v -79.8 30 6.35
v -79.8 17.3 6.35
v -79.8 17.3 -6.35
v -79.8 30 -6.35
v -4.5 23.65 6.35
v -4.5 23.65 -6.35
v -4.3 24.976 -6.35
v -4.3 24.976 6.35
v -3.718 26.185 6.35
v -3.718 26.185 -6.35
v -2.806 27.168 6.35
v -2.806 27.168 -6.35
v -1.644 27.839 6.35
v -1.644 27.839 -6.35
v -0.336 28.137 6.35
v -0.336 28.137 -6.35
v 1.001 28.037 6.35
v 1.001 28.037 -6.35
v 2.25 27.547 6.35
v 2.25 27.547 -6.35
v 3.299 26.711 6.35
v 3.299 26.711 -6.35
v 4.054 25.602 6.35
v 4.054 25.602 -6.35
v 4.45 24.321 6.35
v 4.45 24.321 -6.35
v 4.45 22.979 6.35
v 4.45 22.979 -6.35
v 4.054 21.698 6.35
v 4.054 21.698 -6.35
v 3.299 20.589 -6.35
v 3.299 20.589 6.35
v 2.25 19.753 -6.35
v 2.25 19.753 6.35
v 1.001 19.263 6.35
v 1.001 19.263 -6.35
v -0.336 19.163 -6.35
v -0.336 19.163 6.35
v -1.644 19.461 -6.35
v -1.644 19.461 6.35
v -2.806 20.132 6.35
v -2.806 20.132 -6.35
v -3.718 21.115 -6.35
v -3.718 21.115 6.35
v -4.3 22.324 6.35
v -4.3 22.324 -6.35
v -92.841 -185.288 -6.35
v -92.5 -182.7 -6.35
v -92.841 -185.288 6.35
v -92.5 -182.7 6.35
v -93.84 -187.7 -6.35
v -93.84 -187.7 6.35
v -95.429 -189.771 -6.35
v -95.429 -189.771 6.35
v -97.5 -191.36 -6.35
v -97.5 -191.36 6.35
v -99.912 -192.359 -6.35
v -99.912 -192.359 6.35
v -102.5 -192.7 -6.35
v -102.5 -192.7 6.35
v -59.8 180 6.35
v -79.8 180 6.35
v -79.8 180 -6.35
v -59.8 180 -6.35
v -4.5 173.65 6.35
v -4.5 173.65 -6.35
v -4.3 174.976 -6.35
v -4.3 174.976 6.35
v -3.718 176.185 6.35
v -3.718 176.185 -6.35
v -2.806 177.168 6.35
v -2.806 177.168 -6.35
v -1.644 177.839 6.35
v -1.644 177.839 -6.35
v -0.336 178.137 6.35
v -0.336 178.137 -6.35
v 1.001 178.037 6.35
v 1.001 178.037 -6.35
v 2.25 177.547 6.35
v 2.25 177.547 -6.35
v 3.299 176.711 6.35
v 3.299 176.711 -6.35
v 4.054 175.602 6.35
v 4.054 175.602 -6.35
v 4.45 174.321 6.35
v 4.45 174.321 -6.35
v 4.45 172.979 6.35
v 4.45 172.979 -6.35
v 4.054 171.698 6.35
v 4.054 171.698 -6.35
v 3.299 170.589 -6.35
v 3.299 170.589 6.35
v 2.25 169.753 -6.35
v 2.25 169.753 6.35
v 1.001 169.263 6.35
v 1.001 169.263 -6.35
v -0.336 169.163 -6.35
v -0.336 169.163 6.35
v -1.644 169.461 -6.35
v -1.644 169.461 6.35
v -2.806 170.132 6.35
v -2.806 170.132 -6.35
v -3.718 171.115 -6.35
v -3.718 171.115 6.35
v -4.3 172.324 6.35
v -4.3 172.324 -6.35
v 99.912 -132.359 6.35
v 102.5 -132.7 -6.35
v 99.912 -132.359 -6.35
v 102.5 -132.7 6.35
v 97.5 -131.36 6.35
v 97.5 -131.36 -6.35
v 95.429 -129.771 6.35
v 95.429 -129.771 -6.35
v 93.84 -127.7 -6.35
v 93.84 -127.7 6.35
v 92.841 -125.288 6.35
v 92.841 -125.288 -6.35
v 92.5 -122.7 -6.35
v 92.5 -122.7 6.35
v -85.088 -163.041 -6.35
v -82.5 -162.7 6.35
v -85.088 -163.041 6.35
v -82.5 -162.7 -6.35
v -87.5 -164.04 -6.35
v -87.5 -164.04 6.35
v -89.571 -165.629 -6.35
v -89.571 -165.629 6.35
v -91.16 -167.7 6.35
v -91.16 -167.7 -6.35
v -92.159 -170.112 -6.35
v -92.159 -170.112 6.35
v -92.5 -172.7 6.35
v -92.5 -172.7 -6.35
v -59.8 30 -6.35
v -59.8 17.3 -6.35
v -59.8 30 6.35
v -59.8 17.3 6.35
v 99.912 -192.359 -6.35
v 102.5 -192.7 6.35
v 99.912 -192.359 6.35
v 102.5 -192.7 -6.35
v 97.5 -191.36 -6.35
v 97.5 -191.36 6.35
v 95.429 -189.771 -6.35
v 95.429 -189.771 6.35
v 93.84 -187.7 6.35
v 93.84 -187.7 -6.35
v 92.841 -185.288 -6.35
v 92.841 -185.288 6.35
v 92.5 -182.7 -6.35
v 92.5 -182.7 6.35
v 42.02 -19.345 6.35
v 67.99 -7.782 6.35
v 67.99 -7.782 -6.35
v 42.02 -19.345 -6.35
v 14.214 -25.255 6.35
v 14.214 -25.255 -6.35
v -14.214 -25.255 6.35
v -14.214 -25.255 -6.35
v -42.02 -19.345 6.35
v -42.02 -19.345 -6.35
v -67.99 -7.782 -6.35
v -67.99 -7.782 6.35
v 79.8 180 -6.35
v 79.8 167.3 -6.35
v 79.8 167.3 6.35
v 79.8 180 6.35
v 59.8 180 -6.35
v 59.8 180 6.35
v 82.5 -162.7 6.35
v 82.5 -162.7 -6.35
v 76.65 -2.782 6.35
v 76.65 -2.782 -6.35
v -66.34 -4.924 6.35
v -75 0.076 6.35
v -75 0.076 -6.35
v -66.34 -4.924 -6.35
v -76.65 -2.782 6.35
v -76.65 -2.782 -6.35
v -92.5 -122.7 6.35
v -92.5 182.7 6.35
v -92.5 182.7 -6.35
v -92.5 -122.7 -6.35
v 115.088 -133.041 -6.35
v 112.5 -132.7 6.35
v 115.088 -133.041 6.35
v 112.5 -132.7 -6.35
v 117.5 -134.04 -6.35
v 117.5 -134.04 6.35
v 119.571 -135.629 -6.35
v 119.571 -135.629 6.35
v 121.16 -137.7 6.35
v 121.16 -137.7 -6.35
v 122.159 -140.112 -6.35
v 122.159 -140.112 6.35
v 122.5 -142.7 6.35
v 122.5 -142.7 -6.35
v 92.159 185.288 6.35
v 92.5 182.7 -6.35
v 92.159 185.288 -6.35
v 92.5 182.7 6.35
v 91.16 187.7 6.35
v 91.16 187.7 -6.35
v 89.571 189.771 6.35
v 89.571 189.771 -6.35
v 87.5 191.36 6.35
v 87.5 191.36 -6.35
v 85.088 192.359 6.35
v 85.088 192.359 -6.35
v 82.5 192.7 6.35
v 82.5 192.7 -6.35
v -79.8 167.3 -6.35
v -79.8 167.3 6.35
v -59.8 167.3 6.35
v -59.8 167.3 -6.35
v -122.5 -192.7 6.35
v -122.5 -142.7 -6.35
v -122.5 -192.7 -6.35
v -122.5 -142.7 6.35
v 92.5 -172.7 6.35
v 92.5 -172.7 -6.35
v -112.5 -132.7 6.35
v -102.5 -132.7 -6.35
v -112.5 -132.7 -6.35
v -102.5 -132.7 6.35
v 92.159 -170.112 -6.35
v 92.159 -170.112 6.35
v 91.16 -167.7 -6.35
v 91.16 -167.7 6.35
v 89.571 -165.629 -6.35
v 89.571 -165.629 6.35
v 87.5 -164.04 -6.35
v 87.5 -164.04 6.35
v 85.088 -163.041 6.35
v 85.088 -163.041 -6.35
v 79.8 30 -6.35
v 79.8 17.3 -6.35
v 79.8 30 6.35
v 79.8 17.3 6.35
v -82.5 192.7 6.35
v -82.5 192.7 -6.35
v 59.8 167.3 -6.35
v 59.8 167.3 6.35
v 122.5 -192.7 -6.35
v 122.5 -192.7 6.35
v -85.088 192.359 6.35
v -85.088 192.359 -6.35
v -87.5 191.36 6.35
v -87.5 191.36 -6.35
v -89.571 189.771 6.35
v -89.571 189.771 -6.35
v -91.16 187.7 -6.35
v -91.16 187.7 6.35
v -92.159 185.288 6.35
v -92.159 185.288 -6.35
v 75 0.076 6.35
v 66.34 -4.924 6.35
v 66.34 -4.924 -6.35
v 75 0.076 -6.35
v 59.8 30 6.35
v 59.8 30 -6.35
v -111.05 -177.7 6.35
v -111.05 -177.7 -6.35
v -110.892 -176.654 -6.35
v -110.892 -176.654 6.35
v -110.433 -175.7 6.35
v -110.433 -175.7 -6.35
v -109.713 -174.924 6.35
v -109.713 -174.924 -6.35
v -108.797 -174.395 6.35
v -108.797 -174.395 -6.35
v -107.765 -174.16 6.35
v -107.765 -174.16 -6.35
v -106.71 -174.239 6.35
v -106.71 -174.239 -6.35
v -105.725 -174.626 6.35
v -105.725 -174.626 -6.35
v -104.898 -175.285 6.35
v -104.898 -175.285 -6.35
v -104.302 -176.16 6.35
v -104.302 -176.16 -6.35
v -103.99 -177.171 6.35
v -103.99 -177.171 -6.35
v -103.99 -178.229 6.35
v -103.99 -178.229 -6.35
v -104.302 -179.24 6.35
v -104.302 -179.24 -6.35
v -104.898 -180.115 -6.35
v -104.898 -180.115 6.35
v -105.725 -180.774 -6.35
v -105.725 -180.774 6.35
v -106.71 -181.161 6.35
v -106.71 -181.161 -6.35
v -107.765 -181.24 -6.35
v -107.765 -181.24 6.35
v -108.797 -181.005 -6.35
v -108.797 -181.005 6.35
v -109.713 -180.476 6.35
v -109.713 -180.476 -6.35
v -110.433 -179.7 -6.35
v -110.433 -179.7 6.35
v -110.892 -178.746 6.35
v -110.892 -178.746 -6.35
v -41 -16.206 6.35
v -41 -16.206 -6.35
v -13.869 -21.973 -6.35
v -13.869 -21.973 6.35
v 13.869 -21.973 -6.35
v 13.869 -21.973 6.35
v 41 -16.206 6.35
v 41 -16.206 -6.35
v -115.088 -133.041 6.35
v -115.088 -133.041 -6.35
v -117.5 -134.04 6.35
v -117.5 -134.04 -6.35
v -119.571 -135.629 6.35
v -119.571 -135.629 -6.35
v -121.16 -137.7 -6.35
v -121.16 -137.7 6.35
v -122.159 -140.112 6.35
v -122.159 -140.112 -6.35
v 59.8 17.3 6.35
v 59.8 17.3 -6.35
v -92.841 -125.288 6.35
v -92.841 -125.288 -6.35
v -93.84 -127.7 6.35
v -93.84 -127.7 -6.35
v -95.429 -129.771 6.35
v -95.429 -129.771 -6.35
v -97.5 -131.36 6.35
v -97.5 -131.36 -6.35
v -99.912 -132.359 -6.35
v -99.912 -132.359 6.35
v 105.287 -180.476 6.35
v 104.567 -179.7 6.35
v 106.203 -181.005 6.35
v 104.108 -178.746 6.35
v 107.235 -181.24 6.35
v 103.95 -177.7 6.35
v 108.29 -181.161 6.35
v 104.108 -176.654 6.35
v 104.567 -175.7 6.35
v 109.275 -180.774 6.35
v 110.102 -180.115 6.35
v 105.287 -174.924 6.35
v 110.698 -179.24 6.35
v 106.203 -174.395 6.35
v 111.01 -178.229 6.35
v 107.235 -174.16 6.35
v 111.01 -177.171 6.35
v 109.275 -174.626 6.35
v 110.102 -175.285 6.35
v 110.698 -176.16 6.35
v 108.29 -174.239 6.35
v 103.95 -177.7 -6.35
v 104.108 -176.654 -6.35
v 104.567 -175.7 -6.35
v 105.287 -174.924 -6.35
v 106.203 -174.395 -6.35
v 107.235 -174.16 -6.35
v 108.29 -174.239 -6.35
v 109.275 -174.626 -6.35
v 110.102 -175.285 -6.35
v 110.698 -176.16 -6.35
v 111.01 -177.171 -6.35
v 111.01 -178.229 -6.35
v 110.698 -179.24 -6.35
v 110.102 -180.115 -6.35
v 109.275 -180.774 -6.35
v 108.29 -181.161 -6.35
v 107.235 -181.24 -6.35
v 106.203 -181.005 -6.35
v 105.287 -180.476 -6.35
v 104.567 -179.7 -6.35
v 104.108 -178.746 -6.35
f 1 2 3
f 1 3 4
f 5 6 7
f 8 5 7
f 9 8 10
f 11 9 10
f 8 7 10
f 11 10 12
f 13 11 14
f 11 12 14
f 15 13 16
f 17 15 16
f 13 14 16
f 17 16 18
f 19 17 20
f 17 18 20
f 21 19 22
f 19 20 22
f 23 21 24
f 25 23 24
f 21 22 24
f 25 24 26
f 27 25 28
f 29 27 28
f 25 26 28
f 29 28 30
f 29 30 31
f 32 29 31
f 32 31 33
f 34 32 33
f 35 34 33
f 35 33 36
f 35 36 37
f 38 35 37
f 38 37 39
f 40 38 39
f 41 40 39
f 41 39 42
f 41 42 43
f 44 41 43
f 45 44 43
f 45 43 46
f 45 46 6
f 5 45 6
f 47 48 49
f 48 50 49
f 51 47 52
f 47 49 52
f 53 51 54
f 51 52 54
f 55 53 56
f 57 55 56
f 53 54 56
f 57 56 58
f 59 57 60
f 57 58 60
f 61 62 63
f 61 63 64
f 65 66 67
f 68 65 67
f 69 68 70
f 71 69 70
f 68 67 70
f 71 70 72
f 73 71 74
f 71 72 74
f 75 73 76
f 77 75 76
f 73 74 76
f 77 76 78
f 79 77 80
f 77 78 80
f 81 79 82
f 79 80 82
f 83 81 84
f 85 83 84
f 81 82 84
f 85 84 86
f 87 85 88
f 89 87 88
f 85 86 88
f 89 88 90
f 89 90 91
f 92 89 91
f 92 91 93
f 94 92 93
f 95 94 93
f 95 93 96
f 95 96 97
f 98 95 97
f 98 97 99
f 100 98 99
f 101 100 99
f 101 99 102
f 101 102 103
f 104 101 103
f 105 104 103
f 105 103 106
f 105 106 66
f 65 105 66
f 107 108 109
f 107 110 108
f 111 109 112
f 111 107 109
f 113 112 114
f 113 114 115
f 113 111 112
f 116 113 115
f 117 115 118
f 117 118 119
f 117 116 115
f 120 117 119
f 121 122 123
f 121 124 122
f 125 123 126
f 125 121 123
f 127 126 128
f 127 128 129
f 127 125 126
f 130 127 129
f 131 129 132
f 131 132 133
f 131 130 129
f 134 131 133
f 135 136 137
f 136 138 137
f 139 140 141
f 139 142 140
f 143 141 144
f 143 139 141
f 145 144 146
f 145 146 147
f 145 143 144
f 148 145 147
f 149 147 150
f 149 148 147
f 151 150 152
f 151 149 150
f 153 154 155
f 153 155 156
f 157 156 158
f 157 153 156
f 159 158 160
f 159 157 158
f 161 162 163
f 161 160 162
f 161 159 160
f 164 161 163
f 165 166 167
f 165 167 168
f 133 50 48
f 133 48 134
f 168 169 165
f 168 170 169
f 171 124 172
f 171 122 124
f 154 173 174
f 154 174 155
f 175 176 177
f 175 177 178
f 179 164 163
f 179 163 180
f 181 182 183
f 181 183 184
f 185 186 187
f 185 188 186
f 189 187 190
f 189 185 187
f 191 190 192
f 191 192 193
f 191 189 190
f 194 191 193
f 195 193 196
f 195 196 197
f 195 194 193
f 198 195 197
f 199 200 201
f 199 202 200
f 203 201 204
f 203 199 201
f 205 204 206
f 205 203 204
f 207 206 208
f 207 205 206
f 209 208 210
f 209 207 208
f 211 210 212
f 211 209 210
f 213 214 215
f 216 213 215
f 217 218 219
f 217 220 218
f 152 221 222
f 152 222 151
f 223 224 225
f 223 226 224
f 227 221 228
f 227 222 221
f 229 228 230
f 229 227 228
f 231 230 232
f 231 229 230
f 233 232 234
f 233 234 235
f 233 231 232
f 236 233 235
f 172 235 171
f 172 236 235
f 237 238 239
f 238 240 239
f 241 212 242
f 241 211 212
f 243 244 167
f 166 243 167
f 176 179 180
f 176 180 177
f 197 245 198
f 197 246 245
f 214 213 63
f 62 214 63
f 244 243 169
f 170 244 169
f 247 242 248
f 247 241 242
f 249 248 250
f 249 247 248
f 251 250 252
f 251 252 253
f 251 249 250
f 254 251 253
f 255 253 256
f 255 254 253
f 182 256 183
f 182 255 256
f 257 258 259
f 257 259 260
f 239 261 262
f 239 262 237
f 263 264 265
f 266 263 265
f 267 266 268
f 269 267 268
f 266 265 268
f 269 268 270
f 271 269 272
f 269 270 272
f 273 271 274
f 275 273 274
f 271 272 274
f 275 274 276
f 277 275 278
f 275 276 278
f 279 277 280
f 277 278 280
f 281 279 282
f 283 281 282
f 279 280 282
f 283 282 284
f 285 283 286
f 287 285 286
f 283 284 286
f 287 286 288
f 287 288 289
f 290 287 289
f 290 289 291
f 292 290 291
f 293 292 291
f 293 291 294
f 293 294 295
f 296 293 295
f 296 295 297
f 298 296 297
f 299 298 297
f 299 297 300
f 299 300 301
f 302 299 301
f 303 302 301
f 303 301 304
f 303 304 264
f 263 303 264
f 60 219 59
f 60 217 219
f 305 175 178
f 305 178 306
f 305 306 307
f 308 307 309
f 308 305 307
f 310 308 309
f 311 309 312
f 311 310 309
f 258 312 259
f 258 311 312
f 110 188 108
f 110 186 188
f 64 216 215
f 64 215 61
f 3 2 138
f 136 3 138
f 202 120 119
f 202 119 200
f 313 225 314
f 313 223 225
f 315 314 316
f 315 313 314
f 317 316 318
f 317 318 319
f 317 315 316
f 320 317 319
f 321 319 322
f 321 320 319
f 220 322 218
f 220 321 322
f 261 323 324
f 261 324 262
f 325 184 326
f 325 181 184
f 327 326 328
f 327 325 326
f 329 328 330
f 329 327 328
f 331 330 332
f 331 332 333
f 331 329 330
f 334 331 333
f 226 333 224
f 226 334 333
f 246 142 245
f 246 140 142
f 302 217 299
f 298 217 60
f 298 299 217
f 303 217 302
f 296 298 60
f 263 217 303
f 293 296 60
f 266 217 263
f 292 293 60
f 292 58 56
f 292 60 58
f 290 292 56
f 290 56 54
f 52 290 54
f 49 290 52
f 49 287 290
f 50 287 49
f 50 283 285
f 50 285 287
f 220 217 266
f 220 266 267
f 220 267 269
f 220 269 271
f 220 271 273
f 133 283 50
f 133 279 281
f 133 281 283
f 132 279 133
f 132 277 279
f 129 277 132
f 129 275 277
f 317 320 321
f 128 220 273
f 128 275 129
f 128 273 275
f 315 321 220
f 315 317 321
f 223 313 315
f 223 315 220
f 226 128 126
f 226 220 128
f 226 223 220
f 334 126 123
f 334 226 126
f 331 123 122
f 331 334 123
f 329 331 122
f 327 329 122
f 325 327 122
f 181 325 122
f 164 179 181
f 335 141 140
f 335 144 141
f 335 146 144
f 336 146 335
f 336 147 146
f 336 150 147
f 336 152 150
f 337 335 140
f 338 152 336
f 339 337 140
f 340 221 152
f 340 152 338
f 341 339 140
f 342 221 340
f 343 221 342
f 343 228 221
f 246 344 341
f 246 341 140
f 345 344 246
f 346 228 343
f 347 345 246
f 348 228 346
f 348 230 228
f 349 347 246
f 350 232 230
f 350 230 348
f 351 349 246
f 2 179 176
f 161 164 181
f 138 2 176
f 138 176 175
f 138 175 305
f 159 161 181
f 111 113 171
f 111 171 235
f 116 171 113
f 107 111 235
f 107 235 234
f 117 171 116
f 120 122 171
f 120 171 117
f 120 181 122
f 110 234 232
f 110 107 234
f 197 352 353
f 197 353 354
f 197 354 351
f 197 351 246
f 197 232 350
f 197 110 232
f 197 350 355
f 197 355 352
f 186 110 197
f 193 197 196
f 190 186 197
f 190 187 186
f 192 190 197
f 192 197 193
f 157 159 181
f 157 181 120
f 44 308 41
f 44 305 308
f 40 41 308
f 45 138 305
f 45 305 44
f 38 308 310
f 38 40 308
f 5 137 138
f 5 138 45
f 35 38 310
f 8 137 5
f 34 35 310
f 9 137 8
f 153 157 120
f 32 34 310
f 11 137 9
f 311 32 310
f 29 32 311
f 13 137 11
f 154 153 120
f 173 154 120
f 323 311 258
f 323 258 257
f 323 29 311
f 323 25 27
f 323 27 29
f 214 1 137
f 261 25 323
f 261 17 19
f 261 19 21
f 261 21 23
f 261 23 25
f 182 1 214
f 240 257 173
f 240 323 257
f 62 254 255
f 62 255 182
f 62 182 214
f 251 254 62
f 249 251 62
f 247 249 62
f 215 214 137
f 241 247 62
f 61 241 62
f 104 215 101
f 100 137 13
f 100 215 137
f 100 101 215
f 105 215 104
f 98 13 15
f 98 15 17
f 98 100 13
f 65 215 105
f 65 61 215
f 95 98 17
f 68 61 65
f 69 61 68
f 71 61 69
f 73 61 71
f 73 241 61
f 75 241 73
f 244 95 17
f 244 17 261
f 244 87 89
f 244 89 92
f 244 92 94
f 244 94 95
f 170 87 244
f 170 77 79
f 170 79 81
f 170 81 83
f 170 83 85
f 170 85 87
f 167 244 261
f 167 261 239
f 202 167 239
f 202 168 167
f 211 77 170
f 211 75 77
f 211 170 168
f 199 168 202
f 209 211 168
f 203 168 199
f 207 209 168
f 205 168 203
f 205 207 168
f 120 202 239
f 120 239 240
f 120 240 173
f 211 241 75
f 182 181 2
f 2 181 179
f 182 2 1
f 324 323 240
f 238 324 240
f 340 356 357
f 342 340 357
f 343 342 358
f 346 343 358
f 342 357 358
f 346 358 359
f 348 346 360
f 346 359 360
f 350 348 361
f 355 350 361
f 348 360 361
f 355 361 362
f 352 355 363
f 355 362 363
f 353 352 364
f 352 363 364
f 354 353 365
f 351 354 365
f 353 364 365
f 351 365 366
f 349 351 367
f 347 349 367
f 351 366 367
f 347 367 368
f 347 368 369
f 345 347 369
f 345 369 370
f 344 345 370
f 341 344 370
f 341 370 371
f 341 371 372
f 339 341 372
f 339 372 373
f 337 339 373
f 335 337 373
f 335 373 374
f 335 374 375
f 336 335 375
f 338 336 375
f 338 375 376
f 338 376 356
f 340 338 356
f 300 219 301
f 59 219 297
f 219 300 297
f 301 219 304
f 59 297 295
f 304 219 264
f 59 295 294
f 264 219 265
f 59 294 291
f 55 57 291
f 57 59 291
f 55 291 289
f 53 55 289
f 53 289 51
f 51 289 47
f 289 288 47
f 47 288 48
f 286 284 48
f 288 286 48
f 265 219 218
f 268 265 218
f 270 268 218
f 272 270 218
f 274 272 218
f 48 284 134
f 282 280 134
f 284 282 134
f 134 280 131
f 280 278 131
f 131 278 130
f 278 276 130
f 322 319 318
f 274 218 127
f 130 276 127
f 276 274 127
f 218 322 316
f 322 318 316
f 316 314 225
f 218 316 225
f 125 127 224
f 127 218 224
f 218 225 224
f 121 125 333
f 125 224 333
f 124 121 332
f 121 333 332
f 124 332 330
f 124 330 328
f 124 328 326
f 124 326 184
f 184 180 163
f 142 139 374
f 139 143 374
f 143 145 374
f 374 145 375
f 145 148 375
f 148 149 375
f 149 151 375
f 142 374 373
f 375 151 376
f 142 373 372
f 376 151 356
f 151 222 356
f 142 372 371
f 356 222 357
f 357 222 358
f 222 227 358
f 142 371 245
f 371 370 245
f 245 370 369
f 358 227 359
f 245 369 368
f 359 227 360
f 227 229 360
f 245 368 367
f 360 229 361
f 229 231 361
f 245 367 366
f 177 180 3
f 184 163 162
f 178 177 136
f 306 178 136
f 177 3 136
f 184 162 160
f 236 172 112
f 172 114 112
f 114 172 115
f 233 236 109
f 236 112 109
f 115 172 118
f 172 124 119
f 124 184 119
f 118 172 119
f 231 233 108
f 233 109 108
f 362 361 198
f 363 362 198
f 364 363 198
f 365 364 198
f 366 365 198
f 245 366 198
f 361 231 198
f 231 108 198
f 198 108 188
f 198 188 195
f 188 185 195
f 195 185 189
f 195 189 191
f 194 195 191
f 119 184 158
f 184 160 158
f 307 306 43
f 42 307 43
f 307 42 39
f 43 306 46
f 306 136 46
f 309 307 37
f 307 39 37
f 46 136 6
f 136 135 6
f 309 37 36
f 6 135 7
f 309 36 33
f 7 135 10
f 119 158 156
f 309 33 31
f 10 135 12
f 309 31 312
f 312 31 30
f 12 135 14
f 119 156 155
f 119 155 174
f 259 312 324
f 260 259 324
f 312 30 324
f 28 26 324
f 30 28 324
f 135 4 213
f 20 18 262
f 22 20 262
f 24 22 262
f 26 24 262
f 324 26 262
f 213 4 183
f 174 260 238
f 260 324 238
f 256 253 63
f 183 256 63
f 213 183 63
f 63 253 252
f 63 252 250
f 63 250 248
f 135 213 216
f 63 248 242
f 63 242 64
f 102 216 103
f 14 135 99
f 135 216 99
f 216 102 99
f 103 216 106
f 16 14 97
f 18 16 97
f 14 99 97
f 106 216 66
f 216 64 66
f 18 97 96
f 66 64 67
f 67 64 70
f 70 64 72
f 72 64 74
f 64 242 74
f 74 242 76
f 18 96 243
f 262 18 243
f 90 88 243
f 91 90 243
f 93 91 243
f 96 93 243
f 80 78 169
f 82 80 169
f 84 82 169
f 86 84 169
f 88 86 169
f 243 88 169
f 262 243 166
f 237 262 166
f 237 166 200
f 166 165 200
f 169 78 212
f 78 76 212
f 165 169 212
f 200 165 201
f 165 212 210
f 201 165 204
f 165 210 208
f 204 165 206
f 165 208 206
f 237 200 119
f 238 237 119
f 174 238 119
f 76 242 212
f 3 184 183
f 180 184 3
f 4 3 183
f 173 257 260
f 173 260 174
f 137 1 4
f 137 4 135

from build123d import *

# Parameters (mm, degrees)
MAIN_W                 = 20
MAIN_H                 = 12.7
BOSS_EXTRUDE1_DEPTH    = 6.35
M6_5_CLEARANCE_HOLE1_D = 7.1
CUT_EXTRUDE1_DEPTH     = 229.693747182
M8_CLEARANCE_HOLE1_D   = 9
FILLET1_R              = 10


with BuildPart() as part:
    # MAIN → Boss-Extrude1 (new, symmetric)
    # profile 1 of 3: a face of its own
    with BuildSketch(Plane.XY):
        Polygon((92.5, 192.7), (-92.5, 192.7), (-92.5, -132.7), (-92.5, -162.7), (92.5, -162.7), (92.5, -132.7), align=None)
        with Locations((-69.8, 23.65)):
            Rectangle(MAIN_W, MAIN_H, mode=Mode.SUBTRACT)
        with Locations((-69.8, 173.65)):
            Rectangle(MAIN_W, MAIN_H, mode=Mode.SUBTRACT)
        with Locations((69.8, 23.65)):
            Rectangle(MAIN_W, MAIN_H, mode=Mode.SUBTRACT)
        with Locations((69.8, 173.65)):
            Rectangle(MAIN_W, MAIN_H, mode=Mode.SUBTRACT)
    # profile 2 of 3: a face of its own
    with BuildSketch(Plane.XY):
        Polygon((-92.5, -162.7), (-92.5, -132.7), (-122.5, -132.7), (-122.5, -192.7), (-92.5, -192.7), align=None)
    # profile 3 of 3: a face of its own
    with BuildSketch(Plane.XY):
        Polygon((122.5, -132.7), (92.5, -132.7), (92.5, -162.7), (92.5, -192.7), (122.5, -192.7), align=None)
    extrude(amount=BOSS_EXTRUDE1_DEPTH, both=True)

    # M6.5 Clearance Hole1 (through all)
    with Locations(Plane.XY.offset(6.35)):
        with Locations((-107.5, -177.7), (107.5, -177.7)):
            Hole(M6_5_CLEARANCE_HOLE1_D / 2)

    # Sketch1 → Cut-Extrude1 (cut, through all)
    with BuildSketch(Plane.XY.offset(6.35)):
        with BuildLine():
            Line((-67.989745962, -7.782202476), (-76.65, -2.782202476))
            Line((-76.65, -2.782202476), (-75, 0.075681357))
            Line((-75, 0.075681357), (-66.339745962, -4.924318643))
            ThreePointArc((-66.339745962, -4.924318643), (0, -22.7), (66.339745962, -4.924318643))
            Line((66.339745962, -4.924318643), (75, 0.075681357))
            Line((75, 0.075681357), (76.65, -2.782202476))
            Line((76.65, -2.782202476), (67.989745962, -7.782202476))
            ThreePointArc((67.989745962, -7.782202476), (0, -26), (-67.989745962, -7.782202476))
        make_face()
    extrude(amount=-CUT_EXTRUDE1_DEPTH, mode=Mode.SUBTRACT)

    # M8 Clearance Hole1 (through all)
    with Locations(Plane.XY.offset(6.35)):
        with Locations((0, 173.65), (0, 23.65)):
            Hole(M8_CLEARANCE_HOLE1_D / 2)

    # Fillet1
    fillet1_edges = [part.edges().sort_by_distance(p)[0] for p in [
        (-92.5, 192.7, 0),
        (92.5, 192.7, 0),
        (92.5, -132.7, 0),
        (122.5, -132.7, 0),
        (92.5, -192.7, 0),
        (92.5, -162.7, 0),
        (-92.5, -162.7, 0),
        (-92.5, -192.7, 0),
        (-122.5, -132.7, 0),
        (-92.5, -132.7, 0),
    ]]
    fillet(fillet1_edges, radius=FILLET1_R)


solid = part.part
